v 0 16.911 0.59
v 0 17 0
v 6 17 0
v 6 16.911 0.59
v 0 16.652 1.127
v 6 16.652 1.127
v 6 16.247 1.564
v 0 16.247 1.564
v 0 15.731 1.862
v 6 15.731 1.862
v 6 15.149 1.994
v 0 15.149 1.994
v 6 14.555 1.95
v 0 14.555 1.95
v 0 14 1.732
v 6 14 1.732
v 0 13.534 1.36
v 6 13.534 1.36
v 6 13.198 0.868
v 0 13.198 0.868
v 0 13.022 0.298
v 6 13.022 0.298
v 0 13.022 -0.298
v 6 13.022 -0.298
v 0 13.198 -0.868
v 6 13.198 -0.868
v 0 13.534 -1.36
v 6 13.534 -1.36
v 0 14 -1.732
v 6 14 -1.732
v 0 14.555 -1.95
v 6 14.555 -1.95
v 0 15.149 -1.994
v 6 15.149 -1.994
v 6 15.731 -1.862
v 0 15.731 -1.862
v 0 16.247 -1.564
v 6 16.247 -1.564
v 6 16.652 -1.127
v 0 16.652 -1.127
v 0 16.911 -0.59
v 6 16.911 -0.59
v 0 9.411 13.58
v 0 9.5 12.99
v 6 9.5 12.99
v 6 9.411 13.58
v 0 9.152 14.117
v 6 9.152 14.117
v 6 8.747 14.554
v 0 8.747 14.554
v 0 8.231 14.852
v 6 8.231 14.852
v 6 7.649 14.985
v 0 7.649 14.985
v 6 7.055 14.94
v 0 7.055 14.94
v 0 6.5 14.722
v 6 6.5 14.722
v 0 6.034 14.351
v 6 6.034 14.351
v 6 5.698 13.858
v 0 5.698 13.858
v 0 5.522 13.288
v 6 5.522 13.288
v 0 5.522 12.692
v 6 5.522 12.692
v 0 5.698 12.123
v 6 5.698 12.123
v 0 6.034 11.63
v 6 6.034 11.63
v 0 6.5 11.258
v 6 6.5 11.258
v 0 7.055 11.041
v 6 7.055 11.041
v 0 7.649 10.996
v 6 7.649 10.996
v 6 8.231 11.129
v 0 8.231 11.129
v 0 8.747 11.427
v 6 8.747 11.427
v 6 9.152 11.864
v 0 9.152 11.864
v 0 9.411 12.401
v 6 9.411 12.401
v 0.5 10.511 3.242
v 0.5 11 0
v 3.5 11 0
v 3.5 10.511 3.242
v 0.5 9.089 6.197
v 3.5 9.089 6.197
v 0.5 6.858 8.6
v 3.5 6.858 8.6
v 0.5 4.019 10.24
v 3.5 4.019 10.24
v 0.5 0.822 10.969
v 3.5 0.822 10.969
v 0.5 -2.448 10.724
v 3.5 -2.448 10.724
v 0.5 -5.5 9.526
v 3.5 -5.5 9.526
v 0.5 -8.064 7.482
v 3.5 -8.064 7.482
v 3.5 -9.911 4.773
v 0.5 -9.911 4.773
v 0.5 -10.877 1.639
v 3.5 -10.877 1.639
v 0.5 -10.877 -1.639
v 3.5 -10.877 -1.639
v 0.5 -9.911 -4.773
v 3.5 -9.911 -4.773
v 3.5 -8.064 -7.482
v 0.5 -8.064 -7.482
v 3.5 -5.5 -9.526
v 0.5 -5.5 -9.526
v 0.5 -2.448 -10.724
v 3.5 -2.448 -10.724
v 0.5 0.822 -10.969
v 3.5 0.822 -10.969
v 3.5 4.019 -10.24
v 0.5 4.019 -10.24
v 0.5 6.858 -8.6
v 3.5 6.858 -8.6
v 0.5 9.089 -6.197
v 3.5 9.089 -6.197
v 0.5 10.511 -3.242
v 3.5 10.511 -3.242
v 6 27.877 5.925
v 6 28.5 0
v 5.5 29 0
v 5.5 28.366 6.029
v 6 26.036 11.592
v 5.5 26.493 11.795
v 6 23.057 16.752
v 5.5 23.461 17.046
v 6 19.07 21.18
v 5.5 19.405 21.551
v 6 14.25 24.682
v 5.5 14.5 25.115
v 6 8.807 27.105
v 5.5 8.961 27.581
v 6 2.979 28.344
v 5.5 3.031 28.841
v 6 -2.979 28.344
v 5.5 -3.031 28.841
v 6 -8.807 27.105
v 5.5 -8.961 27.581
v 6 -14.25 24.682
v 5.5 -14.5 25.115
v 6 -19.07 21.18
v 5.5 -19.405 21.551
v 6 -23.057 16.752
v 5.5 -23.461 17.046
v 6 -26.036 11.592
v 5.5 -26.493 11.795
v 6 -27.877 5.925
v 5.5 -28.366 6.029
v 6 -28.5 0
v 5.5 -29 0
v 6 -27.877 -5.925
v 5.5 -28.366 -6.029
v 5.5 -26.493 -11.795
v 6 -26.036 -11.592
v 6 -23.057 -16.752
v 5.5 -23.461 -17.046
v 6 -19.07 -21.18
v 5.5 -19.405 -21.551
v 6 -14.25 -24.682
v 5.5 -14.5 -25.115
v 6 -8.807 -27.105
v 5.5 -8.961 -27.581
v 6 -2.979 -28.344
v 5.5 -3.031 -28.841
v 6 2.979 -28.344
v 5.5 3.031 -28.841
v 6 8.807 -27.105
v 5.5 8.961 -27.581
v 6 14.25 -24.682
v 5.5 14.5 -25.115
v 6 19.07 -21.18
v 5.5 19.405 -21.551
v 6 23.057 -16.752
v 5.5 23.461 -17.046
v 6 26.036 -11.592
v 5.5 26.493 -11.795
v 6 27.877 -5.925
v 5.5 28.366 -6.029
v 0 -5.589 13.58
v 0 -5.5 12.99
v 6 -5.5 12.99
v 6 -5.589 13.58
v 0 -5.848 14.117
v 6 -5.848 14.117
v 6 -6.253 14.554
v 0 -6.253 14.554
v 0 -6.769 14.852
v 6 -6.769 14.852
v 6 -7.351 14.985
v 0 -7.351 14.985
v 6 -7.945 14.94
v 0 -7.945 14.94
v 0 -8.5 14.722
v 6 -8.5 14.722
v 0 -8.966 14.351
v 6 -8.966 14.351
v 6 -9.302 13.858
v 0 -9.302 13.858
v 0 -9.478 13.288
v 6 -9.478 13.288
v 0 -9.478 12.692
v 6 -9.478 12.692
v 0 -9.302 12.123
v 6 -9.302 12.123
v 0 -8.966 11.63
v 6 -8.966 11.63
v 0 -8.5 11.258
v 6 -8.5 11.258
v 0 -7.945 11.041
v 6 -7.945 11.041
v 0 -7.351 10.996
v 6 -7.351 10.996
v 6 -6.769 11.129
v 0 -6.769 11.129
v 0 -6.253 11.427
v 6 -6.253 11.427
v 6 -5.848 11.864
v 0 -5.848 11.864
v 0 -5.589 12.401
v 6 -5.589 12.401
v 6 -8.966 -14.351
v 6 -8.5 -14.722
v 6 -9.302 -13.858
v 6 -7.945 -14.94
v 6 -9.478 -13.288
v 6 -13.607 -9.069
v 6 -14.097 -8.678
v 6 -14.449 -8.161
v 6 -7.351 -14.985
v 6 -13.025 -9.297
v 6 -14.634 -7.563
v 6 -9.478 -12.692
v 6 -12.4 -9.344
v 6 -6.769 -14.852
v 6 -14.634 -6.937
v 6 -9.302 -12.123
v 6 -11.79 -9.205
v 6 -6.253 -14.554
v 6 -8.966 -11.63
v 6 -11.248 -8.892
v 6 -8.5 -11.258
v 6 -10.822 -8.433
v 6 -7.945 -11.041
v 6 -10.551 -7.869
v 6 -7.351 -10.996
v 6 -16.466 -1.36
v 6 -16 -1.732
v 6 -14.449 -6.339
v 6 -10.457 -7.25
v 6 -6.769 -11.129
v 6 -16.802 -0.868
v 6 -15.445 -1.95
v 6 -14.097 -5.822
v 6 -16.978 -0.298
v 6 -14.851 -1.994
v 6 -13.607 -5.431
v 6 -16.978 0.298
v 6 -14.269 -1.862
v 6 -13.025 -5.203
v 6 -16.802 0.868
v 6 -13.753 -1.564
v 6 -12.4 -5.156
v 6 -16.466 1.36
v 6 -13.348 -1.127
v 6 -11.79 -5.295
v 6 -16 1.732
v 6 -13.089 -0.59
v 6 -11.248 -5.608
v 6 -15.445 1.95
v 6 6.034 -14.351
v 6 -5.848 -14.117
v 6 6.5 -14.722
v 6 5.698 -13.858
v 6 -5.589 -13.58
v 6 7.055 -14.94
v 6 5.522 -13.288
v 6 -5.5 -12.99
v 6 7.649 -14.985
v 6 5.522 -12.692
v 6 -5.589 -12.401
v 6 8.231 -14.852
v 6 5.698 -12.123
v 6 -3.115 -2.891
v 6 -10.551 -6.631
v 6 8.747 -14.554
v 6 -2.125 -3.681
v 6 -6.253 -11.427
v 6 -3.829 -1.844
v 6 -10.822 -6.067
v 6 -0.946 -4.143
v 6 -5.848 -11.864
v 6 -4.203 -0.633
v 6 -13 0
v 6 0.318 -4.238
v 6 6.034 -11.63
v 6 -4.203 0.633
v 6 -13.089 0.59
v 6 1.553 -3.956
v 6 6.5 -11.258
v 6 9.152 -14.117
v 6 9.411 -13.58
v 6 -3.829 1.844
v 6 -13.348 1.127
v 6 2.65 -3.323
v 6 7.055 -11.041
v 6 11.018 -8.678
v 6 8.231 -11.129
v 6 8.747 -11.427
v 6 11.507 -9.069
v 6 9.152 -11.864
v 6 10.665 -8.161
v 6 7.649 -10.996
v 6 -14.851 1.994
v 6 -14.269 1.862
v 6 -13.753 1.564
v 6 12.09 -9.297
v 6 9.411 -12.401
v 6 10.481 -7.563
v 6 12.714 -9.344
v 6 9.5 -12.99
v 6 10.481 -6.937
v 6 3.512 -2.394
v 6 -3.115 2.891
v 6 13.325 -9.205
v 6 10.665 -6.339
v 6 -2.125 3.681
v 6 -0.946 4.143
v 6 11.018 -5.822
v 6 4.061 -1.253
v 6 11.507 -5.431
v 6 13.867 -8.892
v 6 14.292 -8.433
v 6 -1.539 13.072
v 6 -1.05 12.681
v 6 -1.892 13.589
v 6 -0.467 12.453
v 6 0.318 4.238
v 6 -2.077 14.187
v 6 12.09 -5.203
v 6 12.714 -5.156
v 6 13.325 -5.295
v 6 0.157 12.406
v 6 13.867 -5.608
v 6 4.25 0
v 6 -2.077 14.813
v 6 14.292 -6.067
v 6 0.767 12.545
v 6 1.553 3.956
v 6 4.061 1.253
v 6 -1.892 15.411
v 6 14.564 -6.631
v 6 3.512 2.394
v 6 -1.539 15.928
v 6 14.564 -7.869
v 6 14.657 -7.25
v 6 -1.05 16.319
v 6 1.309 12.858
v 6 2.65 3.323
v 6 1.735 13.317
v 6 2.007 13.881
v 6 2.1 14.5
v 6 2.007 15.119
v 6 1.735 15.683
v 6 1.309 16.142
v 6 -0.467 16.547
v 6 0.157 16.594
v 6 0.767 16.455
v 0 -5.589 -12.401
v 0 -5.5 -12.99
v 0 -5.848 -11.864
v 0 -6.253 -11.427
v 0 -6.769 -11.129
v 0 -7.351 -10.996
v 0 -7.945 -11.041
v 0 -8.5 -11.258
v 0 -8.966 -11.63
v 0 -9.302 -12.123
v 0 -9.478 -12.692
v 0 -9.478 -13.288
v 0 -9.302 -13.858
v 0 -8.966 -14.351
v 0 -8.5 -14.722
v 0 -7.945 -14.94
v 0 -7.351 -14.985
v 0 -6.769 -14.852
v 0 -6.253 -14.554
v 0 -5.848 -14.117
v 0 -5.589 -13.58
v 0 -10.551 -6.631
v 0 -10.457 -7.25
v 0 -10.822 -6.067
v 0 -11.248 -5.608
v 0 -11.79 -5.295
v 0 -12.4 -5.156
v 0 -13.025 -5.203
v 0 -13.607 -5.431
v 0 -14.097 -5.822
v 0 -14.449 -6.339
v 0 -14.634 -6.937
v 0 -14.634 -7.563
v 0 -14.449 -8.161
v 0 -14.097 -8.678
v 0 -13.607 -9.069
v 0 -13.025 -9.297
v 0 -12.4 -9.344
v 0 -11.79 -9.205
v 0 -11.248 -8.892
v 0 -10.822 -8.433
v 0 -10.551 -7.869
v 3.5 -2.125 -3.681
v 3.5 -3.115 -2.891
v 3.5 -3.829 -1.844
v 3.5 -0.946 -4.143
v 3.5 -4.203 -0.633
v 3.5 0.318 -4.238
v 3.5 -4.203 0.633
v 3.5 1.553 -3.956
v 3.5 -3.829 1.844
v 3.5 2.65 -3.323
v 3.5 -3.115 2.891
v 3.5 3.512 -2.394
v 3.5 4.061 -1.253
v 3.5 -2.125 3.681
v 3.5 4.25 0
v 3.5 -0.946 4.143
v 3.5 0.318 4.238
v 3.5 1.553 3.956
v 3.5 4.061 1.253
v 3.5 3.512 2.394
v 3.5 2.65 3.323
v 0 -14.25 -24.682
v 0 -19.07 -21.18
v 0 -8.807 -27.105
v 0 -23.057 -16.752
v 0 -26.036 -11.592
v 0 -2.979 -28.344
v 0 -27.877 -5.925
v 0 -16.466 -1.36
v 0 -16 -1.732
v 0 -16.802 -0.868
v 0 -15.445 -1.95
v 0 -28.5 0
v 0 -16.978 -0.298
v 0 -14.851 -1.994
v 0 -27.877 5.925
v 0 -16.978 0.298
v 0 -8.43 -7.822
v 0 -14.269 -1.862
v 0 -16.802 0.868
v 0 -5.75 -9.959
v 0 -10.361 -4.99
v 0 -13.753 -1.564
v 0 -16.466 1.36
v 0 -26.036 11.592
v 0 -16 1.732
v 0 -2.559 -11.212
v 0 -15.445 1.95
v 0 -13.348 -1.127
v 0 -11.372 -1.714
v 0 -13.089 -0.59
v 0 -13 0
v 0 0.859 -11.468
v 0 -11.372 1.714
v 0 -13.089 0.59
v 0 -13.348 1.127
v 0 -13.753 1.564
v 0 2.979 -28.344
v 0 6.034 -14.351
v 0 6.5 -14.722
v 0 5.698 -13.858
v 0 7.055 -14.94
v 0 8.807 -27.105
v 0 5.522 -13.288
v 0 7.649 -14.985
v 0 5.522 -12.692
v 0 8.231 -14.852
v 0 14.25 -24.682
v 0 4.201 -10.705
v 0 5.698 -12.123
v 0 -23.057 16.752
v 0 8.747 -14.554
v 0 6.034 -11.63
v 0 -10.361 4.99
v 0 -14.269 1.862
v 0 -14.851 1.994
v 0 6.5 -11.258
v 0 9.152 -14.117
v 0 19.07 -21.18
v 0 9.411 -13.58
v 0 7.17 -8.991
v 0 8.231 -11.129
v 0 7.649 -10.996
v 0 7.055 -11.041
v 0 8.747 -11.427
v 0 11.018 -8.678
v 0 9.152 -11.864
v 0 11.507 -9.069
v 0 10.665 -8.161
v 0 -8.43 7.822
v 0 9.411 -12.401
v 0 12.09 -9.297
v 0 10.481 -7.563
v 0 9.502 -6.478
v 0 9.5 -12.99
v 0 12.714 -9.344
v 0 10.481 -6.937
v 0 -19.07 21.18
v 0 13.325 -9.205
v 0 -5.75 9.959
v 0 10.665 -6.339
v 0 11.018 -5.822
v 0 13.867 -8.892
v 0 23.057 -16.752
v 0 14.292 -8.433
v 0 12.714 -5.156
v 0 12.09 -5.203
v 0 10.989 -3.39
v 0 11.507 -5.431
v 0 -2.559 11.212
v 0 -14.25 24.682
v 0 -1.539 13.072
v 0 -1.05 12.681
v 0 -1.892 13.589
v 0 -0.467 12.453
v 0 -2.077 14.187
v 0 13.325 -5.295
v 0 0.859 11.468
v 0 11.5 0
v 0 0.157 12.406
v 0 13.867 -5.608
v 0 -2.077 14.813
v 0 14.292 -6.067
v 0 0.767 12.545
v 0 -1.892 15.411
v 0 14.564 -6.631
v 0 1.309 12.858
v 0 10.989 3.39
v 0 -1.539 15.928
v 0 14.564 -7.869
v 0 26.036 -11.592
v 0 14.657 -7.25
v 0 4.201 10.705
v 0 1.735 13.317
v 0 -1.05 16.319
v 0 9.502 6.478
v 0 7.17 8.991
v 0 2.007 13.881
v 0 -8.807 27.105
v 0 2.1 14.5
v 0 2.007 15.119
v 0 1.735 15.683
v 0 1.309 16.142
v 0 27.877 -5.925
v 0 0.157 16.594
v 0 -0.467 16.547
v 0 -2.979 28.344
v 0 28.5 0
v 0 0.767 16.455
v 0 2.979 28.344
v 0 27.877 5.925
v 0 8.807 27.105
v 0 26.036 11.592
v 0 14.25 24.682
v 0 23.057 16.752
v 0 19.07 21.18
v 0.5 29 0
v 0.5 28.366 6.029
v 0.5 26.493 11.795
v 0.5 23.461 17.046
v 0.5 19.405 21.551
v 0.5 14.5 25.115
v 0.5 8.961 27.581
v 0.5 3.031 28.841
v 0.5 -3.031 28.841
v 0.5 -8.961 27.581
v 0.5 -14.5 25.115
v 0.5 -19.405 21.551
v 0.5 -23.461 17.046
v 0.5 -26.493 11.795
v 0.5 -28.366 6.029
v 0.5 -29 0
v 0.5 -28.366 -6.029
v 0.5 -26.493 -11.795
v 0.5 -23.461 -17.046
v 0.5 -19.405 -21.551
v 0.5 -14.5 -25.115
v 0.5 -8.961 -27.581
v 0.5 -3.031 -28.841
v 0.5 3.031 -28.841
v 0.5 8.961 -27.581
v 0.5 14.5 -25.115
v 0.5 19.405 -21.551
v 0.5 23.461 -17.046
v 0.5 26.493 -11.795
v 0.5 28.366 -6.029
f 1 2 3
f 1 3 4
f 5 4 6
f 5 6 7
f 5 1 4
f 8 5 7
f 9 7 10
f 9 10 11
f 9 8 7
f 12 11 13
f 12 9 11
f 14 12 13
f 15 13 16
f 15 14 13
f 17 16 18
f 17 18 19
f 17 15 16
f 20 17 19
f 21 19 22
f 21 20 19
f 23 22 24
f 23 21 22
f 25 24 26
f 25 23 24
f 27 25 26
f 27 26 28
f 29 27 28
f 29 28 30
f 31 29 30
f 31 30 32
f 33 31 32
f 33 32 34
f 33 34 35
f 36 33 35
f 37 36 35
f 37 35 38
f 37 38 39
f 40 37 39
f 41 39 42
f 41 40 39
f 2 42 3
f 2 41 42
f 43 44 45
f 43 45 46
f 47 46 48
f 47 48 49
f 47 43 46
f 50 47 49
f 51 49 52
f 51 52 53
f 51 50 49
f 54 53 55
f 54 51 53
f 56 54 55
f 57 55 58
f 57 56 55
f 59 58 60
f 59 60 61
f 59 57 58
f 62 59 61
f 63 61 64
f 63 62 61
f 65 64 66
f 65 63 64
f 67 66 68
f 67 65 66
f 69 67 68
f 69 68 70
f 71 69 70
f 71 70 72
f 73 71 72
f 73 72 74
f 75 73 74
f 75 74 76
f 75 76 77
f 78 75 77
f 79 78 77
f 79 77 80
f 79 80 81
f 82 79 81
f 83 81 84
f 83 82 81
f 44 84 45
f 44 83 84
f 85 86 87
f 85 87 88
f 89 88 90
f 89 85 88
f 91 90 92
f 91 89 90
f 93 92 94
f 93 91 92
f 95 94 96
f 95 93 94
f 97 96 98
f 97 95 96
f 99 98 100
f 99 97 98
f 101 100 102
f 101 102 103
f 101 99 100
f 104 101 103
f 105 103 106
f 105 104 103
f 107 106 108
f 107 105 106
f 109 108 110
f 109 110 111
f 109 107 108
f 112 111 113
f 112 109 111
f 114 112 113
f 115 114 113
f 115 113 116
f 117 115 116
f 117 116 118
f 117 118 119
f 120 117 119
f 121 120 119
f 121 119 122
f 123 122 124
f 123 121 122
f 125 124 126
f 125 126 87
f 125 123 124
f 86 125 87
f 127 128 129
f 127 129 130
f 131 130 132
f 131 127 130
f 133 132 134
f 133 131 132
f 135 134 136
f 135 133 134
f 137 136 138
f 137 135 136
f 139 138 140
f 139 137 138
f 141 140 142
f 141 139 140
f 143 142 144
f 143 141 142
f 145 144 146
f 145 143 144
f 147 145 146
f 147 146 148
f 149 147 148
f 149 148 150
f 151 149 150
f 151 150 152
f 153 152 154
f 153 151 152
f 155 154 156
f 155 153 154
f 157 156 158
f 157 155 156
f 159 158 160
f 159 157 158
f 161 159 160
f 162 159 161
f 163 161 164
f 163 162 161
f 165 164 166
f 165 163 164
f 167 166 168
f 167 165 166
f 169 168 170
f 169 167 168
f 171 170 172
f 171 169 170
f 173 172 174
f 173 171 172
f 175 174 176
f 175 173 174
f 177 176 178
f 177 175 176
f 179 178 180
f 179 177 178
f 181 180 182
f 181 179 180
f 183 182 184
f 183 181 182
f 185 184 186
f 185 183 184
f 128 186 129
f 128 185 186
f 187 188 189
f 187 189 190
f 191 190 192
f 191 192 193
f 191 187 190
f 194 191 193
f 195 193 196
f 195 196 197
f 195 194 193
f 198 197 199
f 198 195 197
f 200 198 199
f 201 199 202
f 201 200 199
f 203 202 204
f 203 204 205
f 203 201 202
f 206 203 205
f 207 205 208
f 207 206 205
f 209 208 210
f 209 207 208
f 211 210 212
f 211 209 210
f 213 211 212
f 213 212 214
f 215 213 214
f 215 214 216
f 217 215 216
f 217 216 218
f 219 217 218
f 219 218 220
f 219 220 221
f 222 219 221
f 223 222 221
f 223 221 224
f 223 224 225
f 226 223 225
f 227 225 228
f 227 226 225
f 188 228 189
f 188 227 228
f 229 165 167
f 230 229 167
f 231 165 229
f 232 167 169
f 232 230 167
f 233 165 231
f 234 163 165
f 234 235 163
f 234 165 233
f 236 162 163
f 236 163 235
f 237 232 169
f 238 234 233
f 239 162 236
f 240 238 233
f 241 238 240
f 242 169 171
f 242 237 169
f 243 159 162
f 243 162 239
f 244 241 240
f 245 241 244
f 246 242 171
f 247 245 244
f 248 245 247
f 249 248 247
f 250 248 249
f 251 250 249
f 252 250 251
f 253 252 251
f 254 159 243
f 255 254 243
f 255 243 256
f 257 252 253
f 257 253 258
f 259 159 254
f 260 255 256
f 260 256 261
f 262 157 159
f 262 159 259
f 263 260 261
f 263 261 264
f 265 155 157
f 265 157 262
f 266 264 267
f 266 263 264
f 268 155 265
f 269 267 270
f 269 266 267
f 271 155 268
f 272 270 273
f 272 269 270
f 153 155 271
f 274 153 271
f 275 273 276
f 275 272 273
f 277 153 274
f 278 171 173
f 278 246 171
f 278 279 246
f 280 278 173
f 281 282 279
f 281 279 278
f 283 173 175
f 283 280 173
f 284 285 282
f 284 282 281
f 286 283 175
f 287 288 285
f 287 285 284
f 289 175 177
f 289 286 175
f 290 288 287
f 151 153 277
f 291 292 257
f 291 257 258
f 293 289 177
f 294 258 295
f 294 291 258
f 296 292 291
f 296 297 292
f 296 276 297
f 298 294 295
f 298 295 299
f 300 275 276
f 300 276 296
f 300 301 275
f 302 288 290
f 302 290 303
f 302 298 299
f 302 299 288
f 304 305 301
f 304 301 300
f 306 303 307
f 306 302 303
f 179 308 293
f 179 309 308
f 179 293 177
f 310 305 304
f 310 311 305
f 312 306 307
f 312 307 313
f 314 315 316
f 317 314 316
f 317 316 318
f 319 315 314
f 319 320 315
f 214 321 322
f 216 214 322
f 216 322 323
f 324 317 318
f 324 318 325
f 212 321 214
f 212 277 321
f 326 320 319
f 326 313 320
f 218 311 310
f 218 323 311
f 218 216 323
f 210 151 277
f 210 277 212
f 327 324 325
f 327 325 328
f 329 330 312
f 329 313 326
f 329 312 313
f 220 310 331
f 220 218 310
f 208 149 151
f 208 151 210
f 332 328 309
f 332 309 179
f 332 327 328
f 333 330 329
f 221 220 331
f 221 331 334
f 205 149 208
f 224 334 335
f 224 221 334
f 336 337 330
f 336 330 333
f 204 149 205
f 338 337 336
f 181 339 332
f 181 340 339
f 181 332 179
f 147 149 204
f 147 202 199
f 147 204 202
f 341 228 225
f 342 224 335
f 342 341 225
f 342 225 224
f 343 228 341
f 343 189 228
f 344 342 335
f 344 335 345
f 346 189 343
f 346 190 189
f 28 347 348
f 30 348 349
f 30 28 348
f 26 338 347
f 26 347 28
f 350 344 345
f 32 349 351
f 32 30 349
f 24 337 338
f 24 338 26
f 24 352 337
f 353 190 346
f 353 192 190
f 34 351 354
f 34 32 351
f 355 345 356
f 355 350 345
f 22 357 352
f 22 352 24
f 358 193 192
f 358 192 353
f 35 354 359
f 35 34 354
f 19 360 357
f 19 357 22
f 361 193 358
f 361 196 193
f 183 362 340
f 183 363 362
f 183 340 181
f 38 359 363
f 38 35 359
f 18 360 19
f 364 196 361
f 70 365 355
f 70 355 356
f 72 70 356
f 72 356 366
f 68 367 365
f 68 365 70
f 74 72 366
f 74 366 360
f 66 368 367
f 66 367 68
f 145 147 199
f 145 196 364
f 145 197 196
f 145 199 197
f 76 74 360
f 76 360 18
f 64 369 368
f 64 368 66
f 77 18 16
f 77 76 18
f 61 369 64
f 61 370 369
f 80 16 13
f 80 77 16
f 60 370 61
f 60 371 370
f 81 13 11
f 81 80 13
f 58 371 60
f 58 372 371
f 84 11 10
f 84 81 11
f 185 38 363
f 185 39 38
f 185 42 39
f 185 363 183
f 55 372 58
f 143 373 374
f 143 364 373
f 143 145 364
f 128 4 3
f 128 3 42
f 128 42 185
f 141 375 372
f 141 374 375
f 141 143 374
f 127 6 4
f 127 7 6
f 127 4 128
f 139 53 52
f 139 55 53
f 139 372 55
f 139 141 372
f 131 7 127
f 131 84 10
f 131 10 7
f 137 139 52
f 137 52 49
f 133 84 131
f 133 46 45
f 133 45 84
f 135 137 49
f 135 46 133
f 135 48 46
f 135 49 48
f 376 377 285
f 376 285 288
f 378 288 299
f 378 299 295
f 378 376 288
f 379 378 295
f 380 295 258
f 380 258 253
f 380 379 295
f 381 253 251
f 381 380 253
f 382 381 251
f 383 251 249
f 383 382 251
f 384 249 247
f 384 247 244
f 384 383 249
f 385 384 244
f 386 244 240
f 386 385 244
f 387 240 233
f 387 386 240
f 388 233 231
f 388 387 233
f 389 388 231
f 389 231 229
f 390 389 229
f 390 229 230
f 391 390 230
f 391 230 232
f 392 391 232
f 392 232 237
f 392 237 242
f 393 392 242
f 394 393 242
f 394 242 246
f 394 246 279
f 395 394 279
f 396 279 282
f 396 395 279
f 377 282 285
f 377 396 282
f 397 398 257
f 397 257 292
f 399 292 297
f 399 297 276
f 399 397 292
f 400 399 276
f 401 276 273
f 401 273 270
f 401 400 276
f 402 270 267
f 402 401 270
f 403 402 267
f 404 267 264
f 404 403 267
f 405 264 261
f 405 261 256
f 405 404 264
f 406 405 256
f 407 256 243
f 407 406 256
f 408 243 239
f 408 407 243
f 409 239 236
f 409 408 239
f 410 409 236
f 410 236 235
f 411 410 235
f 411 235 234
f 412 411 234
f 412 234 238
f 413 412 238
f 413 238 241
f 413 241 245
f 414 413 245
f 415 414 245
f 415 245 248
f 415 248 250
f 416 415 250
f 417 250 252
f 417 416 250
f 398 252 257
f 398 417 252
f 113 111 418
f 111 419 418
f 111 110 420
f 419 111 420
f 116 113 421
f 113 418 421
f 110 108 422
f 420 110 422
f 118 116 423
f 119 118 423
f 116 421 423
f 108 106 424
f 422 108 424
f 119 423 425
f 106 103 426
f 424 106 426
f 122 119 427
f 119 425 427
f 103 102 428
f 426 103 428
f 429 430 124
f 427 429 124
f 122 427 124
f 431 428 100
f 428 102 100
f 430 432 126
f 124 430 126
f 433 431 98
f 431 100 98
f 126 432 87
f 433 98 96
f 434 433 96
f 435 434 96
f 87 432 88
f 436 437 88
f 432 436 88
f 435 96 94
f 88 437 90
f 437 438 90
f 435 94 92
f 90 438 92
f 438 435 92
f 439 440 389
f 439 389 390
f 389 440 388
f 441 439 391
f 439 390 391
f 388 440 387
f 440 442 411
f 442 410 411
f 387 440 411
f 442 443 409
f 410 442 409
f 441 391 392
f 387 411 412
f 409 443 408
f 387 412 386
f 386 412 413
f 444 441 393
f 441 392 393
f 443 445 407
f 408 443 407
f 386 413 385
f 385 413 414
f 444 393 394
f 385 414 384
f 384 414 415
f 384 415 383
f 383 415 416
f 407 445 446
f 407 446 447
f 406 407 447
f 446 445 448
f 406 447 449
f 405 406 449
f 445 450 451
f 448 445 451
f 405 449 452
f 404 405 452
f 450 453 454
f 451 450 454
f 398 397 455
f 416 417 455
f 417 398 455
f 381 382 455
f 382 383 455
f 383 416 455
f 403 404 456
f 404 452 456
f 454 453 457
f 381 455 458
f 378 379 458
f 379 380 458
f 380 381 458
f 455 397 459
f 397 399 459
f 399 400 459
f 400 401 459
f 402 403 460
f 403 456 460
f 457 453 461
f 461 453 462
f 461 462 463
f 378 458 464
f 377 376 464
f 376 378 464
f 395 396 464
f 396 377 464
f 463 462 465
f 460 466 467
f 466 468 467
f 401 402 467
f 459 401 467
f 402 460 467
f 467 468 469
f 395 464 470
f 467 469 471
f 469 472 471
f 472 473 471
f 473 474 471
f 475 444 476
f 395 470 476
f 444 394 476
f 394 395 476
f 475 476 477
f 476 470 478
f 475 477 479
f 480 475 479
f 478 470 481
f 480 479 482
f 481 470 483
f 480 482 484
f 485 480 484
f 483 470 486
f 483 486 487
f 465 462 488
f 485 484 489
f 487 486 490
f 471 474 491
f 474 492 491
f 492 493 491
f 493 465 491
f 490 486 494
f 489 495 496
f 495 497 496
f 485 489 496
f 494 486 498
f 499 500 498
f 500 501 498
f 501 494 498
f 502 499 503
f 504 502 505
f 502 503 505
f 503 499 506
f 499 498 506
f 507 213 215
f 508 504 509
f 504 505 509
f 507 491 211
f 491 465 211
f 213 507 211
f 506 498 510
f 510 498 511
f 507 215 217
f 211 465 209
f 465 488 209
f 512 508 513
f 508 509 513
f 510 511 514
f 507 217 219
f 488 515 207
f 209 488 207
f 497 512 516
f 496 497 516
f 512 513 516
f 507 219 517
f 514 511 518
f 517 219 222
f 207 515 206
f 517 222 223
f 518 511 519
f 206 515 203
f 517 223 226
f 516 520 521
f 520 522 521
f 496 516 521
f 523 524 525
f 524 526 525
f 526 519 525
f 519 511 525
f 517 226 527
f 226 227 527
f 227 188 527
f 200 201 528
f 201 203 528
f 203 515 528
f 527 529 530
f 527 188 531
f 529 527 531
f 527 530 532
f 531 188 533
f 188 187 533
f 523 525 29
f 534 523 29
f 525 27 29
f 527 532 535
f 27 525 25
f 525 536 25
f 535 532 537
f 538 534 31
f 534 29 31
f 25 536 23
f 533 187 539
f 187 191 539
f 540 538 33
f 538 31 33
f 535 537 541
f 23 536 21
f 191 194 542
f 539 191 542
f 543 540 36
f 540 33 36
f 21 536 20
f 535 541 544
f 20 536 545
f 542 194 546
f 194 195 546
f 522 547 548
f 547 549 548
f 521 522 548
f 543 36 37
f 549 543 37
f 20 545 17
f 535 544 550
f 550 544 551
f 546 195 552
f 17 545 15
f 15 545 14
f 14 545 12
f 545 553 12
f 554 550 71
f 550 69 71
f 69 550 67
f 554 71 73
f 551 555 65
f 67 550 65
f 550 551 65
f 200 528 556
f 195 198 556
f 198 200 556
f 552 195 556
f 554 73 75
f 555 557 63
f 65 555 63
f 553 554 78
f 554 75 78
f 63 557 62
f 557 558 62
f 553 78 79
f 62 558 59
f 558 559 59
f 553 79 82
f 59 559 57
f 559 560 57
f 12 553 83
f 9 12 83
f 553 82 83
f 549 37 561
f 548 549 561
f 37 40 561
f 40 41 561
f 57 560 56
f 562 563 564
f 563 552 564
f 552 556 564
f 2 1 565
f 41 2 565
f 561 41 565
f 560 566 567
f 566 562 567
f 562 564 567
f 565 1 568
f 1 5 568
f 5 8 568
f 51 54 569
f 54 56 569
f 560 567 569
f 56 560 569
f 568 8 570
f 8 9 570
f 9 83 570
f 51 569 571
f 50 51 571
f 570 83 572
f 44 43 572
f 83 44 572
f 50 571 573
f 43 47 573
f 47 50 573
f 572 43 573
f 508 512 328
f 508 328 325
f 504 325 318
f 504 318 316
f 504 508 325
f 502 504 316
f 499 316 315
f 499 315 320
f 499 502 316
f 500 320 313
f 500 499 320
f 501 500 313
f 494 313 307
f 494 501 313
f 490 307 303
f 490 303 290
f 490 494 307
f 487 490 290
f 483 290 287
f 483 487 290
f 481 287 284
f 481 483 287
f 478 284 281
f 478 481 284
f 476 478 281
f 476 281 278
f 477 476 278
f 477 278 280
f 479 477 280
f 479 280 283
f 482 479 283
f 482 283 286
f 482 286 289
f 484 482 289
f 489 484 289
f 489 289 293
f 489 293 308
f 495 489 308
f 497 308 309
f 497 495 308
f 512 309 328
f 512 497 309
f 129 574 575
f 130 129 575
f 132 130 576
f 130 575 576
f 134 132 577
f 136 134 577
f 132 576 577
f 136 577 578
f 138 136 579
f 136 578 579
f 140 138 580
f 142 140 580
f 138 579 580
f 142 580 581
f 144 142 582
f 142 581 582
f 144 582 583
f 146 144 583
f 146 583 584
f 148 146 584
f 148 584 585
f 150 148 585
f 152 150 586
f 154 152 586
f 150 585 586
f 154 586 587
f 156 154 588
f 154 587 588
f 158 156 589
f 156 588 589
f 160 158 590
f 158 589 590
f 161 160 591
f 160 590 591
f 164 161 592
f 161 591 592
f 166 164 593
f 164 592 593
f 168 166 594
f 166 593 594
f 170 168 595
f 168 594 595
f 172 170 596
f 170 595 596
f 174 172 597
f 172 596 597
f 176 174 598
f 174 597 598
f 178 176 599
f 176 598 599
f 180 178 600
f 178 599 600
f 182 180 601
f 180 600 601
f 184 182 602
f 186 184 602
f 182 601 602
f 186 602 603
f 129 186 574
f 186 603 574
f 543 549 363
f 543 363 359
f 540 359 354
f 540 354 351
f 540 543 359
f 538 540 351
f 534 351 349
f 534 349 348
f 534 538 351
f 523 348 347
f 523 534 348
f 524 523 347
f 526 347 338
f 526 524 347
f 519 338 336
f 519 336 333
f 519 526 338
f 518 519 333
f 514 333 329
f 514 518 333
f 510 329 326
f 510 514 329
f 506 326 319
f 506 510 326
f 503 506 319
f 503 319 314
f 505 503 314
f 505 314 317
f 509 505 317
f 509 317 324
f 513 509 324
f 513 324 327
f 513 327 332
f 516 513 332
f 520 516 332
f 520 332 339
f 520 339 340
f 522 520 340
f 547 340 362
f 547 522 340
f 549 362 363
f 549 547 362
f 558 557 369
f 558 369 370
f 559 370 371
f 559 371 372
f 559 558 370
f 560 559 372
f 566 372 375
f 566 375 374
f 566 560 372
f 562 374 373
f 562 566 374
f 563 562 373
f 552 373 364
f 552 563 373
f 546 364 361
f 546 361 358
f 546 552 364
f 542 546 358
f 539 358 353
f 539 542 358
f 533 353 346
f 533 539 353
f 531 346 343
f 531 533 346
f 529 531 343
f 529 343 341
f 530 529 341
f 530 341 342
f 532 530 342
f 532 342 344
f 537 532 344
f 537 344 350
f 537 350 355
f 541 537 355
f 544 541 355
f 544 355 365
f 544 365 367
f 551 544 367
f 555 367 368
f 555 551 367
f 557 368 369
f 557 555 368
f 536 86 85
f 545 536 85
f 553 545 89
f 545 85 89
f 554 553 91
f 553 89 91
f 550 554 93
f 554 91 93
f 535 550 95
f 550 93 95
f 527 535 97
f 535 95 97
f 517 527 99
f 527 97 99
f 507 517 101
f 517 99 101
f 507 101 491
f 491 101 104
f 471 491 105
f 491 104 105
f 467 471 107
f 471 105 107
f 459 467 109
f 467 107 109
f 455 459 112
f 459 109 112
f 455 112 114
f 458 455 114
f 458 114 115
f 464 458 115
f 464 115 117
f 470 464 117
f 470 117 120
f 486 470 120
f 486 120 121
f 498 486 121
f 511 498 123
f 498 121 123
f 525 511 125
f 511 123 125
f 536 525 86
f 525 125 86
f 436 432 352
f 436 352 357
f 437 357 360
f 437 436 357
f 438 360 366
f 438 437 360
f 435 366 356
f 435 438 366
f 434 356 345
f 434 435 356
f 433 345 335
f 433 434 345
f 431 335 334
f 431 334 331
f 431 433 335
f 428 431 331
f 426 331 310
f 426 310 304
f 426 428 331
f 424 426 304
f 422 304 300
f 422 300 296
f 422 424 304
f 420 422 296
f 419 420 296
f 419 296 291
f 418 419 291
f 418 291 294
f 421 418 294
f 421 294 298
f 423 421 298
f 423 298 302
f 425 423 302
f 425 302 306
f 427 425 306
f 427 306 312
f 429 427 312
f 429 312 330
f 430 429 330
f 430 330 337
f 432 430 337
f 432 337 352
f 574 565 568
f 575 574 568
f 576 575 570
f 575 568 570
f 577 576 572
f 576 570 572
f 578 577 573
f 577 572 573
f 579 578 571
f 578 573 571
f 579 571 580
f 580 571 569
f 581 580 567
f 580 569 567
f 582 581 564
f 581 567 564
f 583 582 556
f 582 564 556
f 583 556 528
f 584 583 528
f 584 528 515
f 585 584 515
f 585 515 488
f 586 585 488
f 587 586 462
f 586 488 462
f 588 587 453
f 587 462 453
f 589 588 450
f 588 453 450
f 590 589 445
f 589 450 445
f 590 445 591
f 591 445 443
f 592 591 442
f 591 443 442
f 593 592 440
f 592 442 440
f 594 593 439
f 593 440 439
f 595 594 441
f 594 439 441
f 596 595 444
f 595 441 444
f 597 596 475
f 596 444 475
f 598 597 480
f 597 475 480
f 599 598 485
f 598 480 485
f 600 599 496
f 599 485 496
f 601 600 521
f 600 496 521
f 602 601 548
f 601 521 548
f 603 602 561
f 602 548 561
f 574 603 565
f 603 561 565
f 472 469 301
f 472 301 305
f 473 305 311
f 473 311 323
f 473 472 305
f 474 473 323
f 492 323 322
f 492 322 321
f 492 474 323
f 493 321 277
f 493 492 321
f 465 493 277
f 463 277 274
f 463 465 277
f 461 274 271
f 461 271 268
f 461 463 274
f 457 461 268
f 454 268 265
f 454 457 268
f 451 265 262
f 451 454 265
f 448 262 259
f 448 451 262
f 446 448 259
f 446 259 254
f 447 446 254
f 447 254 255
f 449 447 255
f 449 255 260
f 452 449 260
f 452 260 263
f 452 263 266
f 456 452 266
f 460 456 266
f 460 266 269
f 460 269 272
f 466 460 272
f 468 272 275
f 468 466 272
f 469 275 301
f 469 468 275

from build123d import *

# Parameters (mm, degrees)
F0_R     = 29
F0_R_2   = 2
F0_R_3   = 2.1
F0_R_4   = 4.25
F1_DEPTH = 6
F2_R     = 11
F3_DEPTH = 3.5
F4_SIZE  = 0.5


# Not quite as in the source:
# - a feature names something its author has since deleted; it is built from what else it names


with BuildPart() as f1:
    # F0 (on Right) → F1 (new body)
    with BuildSketch(Plane.YZ):
        Circle(F0_R)
        with Locations((-7.5, -12.9903810568)):
            Circle(F0_R_2, mode=Mode.SUBTRACT)
        with Locations((-12.5573683549, -7.25)):
            Circle(F0_R_3, mode=Mode.SUBTRACT)
        with Locations((7.5, -12.9903810568)):
            Circle(F0_R_2, mode=Mode.SUBTRACT)
        with Locations((12.5573683549, -7.25)):
            Circle(F0_R_3, mode=Mode.SUBTRACT)
        with Locations((-15, 0)):
            Circle(F0_R_2, mode=Mode.SUBTRACT)
        with Locations((-7.5, 12.9903810568)):
            Circle(F0_R_2, mode=Mode.SUBTRACT)
        Circle(F0_R_4, mode=Mode.SUBTRACT)
        with Locations((7.5, 12.9903810568)):
            Circle(F0_R_2, mode=Mode.SUBTRACT)
        with Locations((15, 0)):
            Circle(F0_R_2, mode=Mode.SUBTRACT)
        with Locations((0, 14.5)):
            Circle(F0_R_3, mode=Mode.SUBTRACT)
    extrude(amount=F1_DEPTH)

    # F2 (on Right) → F3 (cut)
    with BuildSketch(Plane.YZ):
        Circle(F2_R)
    extrude(amount=F3_DEPTH, mode=Mode.SUBTRACT)

    # F4
    f4_edges = [f1.edges().sort_by_distance(p)[0] for p in [
        (0, -11, 0),
        (0, -29, 0),
        (6, -29, 0),
    ]]
    chamfer(f4_edges, length=F4_SIZE)


solid = f1.part
